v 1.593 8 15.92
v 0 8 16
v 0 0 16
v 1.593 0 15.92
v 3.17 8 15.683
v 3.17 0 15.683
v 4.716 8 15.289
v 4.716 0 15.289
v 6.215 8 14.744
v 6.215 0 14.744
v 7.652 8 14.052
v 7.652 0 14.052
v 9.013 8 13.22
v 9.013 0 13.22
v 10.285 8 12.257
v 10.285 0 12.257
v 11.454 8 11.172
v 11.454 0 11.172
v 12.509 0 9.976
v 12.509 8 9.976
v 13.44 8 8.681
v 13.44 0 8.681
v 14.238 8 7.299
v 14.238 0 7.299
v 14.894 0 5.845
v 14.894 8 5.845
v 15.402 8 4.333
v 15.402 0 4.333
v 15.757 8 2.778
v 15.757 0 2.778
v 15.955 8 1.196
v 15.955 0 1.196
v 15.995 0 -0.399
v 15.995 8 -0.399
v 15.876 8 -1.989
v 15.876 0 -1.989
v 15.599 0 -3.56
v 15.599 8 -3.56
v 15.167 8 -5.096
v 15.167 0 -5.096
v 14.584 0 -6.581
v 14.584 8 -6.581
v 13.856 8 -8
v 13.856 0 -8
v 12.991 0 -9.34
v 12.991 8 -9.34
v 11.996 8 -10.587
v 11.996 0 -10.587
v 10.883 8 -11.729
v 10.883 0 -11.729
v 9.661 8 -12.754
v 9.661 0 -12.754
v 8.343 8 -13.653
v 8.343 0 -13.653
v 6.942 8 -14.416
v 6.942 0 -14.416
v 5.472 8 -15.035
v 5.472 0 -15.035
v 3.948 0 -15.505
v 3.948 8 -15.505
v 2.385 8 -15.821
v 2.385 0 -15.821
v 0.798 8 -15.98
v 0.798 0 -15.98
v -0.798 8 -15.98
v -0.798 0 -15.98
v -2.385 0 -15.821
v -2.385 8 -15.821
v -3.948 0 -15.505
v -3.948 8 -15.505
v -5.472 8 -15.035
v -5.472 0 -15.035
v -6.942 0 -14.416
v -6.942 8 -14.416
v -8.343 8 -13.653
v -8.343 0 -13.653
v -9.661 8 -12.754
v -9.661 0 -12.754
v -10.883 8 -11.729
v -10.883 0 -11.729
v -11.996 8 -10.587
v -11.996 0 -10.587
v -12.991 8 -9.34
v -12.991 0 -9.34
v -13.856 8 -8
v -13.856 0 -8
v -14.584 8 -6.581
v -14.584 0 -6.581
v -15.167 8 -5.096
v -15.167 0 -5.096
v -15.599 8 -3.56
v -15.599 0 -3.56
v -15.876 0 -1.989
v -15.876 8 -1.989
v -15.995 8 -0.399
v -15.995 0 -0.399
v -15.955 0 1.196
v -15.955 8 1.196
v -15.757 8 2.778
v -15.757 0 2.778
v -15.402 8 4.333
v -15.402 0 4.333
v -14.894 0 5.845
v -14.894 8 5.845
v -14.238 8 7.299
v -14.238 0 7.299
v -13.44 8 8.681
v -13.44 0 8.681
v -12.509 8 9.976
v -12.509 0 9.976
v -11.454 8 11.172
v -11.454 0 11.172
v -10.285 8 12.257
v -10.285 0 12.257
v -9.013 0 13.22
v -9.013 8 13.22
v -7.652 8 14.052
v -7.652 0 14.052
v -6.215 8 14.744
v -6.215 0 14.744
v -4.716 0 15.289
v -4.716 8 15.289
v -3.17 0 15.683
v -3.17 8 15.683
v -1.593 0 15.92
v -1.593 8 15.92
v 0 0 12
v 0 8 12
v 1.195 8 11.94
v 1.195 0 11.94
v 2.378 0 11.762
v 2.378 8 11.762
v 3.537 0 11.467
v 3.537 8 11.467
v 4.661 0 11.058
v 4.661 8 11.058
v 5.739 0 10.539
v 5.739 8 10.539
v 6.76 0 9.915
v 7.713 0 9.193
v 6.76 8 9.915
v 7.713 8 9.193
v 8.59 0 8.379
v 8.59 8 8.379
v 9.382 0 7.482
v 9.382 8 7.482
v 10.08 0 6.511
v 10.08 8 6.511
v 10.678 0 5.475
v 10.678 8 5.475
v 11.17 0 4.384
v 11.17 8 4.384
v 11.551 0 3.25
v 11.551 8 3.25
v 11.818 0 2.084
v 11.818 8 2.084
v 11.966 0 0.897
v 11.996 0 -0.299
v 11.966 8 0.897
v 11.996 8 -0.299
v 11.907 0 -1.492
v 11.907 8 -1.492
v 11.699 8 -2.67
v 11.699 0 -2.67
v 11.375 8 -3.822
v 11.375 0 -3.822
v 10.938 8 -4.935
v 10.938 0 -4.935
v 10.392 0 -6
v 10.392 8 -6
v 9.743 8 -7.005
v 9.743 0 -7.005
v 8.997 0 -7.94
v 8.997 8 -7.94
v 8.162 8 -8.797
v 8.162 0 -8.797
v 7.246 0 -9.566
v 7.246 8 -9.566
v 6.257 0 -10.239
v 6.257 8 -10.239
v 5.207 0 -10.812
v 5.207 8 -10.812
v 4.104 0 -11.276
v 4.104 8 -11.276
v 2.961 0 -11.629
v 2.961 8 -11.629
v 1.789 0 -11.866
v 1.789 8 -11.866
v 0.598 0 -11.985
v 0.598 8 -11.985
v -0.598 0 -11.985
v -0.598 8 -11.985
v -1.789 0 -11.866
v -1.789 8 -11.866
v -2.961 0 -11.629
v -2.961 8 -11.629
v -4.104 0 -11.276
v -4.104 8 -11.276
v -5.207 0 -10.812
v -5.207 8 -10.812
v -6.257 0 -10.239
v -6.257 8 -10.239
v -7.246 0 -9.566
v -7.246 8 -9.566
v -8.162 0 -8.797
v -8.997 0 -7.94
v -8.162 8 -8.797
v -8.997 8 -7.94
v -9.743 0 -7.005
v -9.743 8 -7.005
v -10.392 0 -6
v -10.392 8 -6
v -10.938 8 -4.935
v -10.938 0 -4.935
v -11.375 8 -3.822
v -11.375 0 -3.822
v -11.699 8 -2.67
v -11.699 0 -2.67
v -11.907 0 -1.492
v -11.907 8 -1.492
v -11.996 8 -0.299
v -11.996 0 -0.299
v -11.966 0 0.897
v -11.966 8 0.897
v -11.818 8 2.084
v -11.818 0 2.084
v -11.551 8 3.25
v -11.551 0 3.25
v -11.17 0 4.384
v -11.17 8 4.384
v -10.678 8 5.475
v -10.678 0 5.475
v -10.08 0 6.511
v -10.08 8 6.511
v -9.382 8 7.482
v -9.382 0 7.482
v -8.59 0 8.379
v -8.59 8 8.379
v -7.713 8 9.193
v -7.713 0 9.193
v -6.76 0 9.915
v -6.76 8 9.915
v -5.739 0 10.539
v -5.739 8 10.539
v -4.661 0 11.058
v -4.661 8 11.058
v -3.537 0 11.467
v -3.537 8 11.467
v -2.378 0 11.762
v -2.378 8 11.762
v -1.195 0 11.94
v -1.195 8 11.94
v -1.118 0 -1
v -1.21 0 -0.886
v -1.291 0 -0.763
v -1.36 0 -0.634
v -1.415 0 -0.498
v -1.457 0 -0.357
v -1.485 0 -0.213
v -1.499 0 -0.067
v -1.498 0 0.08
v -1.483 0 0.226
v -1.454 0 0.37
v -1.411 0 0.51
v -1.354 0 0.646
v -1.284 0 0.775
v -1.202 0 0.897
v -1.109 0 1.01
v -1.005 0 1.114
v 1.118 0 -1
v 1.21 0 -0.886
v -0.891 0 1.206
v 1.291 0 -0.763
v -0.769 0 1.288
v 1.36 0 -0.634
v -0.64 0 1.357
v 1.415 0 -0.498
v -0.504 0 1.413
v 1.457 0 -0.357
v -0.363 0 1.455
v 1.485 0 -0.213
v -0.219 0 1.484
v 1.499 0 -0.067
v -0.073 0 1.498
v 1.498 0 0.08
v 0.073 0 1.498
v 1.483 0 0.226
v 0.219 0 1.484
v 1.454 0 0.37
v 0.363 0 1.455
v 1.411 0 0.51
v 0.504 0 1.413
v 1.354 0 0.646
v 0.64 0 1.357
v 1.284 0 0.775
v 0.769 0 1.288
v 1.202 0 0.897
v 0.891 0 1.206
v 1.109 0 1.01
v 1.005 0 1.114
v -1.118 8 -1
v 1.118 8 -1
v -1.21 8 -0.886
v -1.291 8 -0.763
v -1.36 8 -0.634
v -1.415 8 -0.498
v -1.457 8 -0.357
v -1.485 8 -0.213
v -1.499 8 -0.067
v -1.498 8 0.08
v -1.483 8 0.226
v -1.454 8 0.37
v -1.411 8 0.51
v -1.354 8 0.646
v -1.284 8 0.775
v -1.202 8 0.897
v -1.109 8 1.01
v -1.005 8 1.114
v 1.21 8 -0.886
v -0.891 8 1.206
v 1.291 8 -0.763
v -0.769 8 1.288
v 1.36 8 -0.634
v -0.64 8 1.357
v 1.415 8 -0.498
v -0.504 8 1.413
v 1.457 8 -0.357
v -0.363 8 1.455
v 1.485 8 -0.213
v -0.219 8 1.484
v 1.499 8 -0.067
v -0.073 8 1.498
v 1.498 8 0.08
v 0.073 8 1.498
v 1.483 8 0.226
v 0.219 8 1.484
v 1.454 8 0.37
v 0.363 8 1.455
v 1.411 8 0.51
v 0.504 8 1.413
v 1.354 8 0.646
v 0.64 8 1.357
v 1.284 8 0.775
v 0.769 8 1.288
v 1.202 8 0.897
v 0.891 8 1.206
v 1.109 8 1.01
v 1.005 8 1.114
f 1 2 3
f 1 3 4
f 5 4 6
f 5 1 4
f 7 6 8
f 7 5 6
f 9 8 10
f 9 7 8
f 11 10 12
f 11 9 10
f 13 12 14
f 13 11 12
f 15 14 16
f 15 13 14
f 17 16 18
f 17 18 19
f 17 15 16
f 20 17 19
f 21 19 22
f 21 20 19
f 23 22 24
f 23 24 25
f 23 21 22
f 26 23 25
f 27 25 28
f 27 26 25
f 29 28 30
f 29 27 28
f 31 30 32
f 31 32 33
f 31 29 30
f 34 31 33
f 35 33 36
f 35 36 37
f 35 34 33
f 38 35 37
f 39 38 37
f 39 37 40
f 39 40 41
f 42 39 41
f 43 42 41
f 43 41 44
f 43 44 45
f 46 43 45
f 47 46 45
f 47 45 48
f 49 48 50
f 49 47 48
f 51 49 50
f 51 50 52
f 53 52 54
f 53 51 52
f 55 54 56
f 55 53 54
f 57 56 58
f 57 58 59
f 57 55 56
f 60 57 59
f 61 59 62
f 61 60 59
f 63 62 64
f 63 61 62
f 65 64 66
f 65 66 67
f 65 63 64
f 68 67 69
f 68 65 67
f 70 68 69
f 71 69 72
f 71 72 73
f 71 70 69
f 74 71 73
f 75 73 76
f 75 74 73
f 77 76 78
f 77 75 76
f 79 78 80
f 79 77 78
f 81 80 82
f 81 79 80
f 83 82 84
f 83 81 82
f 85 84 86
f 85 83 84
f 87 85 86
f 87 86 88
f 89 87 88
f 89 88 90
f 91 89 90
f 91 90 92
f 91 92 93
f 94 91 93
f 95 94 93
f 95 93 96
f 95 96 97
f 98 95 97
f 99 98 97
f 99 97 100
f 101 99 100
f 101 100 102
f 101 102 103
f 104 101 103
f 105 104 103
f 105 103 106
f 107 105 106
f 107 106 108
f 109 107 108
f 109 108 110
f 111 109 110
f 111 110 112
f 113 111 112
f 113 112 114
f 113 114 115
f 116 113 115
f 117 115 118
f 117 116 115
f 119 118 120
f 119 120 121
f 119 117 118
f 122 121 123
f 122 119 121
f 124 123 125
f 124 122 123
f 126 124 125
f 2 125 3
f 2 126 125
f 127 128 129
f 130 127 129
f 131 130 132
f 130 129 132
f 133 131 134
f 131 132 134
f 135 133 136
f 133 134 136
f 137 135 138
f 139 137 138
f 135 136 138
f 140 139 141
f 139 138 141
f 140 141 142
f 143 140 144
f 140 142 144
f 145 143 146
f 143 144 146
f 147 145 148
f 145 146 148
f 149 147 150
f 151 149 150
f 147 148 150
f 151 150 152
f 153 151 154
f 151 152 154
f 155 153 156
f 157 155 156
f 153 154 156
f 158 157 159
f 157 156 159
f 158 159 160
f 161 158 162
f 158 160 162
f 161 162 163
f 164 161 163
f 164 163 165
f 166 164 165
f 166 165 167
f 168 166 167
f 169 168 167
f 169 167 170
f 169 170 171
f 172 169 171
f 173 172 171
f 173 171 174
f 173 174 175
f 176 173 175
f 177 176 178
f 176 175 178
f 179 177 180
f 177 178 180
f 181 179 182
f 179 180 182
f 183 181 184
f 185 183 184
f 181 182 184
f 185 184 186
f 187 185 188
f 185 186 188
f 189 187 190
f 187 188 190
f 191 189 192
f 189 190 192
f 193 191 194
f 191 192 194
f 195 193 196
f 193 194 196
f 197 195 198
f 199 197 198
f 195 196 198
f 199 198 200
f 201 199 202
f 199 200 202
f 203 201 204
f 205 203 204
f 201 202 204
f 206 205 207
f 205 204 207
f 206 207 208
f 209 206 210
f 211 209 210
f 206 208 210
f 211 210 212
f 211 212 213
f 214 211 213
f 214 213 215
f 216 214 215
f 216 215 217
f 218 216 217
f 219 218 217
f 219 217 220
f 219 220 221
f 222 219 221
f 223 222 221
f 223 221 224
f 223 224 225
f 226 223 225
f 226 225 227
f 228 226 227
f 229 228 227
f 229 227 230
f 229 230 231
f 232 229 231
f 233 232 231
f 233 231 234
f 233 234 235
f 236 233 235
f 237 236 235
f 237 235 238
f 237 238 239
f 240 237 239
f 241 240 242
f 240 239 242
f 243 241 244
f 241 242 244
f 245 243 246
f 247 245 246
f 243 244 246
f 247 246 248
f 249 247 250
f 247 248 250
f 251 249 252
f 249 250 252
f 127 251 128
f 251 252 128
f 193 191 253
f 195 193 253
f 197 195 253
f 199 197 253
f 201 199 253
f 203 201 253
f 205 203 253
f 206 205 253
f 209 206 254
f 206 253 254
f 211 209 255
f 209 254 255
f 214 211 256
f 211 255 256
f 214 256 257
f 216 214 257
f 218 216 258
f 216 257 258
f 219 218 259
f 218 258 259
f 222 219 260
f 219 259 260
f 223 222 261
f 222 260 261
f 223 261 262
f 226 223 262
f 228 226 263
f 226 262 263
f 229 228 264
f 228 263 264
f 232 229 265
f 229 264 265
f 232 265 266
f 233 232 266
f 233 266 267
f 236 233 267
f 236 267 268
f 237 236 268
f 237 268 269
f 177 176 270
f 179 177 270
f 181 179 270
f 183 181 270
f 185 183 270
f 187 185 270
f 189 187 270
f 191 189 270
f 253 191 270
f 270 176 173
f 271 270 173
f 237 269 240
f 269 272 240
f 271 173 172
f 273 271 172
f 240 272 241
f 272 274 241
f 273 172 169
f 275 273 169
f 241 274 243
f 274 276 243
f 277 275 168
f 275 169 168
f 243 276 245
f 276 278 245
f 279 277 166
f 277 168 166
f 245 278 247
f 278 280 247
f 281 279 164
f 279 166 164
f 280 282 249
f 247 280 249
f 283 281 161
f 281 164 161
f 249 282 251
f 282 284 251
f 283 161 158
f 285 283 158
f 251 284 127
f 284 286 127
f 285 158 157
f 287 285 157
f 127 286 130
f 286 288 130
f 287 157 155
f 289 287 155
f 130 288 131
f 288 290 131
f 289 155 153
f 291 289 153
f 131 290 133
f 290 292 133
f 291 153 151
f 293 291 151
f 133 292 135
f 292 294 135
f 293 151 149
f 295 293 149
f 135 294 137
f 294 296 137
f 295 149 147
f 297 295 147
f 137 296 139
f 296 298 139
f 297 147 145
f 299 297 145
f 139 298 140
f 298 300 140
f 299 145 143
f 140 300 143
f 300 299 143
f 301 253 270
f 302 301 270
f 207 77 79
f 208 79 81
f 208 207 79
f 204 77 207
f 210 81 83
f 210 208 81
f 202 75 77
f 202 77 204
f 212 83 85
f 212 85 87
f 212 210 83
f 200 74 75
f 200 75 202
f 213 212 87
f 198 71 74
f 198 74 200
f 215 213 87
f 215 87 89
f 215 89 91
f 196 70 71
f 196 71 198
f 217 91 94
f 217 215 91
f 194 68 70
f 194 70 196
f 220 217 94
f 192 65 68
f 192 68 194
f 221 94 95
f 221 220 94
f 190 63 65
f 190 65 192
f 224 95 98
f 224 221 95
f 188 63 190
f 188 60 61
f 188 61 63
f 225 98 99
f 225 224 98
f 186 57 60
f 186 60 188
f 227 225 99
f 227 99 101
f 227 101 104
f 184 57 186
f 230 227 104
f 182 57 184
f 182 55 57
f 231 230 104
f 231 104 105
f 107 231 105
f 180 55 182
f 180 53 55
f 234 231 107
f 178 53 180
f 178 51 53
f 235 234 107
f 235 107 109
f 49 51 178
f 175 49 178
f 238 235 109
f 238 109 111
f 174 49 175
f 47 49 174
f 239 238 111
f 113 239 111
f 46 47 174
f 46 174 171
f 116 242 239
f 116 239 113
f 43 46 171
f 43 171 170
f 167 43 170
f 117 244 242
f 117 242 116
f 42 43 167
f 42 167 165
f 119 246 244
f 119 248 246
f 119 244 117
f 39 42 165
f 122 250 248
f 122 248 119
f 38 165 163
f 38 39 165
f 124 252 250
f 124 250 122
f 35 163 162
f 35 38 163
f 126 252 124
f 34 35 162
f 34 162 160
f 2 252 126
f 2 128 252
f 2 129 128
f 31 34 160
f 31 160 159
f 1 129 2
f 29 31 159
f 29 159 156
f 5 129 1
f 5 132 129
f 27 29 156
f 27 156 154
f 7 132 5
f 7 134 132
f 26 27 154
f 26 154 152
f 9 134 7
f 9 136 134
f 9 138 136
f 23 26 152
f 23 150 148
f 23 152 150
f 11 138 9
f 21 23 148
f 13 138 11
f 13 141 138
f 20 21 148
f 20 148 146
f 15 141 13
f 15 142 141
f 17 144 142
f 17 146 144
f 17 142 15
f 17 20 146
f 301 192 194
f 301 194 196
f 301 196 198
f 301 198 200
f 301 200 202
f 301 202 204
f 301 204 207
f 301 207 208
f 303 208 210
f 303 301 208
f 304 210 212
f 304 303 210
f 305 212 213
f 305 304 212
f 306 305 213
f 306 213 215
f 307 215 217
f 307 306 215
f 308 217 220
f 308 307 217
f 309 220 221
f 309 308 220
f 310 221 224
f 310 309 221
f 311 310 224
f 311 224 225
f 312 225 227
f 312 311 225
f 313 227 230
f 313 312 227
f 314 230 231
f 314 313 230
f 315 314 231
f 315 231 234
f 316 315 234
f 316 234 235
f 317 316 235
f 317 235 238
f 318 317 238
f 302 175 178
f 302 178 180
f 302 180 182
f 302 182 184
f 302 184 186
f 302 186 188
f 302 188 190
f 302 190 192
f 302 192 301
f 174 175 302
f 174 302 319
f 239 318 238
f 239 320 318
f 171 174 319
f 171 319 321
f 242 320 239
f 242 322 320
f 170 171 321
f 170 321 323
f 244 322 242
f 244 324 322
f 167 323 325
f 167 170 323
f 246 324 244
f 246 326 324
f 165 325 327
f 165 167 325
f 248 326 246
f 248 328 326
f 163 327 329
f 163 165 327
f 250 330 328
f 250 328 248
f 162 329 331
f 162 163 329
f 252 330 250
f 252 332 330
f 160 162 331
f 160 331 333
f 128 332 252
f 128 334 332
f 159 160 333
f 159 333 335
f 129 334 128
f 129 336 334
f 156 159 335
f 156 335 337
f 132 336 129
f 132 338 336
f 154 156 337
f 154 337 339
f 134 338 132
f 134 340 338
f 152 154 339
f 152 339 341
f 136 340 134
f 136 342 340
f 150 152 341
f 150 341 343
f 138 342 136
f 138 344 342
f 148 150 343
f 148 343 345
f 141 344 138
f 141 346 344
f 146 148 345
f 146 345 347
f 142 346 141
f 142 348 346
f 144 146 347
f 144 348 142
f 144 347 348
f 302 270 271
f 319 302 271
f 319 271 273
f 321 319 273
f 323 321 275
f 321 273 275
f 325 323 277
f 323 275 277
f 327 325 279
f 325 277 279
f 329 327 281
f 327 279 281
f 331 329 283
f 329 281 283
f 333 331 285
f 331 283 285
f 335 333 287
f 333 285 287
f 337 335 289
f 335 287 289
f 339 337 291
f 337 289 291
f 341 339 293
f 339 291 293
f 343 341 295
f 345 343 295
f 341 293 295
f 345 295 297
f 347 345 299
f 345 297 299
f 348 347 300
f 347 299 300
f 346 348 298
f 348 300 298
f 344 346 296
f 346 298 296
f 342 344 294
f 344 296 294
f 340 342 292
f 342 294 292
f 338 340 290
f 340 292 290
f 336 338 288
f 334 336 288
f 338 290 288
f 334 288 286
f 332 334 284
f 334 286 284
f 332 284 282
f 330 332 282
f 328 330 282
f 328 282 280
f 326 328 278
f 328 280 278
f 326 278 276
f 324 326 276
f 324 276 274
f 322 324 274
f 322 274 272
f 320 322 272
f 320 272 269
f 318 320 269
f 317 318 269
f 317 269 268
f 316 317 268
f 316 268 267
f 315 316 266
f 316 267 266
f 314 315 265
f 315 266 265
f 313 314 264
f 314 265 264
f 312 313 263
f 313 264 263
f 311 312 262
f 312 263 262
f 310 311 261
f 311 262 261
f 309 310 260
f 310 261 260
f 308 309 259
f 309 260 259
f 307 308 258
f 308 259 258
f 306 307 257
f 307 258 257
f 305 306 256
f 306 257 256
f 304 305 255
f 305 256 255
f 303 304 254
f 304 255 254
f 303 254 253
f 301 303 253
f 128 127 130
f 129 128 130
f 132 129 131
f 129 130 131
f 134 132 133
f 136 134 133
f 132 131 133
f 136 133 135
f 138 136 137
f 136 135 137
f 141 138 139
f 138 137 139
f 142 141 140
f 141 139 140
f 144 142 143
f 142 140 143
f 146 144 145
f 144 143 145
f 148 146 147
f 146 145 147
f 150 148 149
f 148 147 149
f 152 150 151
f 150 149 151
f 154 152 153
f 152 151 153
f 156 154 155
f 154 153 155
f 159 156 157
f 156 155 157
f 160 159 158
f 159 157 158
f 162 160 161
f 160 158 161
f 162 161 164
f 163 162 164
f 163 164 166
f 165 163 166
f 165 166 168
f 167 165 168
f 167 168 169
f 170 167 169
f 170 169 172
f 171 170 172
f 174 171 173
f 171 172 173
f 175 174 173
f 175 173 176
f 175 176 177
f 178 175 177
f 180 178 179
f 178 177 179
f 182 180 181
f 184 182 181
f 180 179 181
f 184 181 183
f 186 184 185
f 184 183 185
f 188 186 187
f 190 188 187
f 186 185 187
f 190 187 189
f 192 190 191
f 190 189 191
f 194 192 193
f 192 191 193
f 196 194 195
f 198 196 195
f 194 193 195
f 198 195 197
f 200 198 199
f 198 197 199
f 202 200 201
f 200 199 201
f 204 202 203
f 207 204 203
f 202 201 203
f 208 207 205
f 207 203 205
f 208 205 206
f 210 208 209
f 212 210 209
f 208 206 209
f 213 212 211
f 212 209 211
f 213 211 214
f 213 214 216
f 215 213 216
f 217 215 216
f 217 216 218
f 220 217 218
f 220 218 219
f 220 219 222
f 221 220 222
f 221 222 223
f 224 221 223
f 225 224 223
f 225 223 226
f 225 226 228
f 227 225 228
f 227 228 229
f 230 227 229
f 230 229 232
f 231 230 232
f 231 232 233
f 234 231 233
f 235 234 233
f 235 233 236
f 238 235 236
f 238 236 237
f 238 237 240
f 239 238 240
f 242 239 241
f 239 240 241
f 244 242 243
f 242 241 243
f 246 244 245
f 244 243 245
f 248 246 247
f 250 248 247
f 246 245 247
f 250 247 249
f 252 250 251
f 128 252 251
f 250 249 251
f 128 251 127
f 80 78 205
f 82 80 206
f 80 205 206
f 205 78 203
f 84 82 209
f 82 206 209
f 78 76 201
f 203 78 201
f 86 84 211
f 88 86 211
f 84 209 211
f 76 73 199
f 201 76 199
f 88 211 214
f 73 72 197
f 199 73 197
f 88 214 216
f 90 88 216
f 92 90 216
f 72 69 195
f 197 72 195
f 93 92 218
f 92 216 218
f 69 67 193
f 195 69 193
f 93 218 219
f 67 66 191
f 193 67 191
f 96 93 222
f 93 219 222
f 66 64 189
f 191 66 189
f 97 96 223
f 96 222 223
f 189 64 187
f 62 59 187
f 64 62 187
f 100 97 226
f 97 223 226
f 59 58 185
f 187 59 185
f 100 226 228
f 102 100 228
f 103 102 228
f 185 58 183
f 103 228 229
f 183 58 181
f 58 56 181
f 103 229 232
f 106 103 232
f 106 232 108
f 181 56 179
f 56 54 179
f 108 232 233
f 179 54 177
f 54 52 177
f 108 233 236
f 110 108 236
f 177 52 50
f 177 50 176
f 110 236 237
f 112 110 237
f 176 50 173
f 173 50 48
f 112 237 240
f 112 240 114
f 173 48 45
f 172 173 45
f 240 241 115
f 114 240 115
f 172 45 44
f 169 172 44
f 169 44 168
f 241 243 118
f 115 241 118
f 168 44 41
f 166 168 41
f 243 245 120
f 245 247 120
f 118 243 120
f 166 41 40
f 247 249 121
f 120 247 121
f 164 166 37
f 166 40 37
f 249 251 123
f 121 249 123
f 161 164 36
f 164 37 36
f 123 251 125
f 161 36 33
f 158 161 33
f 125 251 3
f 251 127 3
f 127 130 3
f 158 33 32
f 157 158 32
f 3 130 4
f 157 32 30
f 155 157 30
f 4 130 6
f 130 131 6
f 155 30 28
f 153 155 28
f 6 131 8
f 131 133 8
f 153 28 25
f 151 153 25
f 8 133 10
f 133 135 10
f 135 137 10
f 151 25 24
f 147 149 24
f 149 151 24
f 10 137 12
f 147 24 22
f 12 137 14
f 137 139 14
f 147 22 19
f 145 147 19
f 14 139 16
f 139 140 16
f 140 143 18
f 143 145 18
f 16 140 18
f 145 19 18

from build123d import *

# Parameters (mm, degrees)
SKETCH_1_R      = 12
EXTRUDE_1_DEPTH = 8
SKETCH_2_R      = 16
SKETCH_2_R_2    = 12
EXTRUDE_2_DEPTH = 8


with BuildPart() as part:
    # 草图1 → 凸台-拉伸1 (new body)
    with BuildSketch(Plane(origin=(0, 0, 0), x_dir=(1, 0, 0), z_dir=(0, 1, 0))):
        with Locations(Location((0, 0, 0), (0, 0, 270))):
            Circle(SKETCH_1_R)
        with BuildLine():
            Line((-1.118033989, 1), (1.118033989, 1))
            ThreePointArc((1.118033989, 1), (0, -1.5), (-1.118033989, 1))
        make_face(mode=Mode.SUBTRACT)
    extrude(amount=EXTRUDE_1_DEPTH)


with BuildPart() as body_2:
    # 草图2 → 凸台-拉伸2 (new body)
    with BuildSketch(Plane(origin=(0, 8, 0), x_dir=(1, 0, 0), z_dir=(0, 1, 0))):
        with Locations(Location((0, 0, 0), (0, 0, 270))):
            Circle(SKETCH_2_R)
        with Locations(Location((0, 0, 0), (0, 0, 270))):
            Circle(SKETCH_2_R_2, mode=Mode.SUBTRACT)
    extrude(amount=-EXTRUDE_2_DEPTH)


solid = Compound([part.part, body_2.part])
